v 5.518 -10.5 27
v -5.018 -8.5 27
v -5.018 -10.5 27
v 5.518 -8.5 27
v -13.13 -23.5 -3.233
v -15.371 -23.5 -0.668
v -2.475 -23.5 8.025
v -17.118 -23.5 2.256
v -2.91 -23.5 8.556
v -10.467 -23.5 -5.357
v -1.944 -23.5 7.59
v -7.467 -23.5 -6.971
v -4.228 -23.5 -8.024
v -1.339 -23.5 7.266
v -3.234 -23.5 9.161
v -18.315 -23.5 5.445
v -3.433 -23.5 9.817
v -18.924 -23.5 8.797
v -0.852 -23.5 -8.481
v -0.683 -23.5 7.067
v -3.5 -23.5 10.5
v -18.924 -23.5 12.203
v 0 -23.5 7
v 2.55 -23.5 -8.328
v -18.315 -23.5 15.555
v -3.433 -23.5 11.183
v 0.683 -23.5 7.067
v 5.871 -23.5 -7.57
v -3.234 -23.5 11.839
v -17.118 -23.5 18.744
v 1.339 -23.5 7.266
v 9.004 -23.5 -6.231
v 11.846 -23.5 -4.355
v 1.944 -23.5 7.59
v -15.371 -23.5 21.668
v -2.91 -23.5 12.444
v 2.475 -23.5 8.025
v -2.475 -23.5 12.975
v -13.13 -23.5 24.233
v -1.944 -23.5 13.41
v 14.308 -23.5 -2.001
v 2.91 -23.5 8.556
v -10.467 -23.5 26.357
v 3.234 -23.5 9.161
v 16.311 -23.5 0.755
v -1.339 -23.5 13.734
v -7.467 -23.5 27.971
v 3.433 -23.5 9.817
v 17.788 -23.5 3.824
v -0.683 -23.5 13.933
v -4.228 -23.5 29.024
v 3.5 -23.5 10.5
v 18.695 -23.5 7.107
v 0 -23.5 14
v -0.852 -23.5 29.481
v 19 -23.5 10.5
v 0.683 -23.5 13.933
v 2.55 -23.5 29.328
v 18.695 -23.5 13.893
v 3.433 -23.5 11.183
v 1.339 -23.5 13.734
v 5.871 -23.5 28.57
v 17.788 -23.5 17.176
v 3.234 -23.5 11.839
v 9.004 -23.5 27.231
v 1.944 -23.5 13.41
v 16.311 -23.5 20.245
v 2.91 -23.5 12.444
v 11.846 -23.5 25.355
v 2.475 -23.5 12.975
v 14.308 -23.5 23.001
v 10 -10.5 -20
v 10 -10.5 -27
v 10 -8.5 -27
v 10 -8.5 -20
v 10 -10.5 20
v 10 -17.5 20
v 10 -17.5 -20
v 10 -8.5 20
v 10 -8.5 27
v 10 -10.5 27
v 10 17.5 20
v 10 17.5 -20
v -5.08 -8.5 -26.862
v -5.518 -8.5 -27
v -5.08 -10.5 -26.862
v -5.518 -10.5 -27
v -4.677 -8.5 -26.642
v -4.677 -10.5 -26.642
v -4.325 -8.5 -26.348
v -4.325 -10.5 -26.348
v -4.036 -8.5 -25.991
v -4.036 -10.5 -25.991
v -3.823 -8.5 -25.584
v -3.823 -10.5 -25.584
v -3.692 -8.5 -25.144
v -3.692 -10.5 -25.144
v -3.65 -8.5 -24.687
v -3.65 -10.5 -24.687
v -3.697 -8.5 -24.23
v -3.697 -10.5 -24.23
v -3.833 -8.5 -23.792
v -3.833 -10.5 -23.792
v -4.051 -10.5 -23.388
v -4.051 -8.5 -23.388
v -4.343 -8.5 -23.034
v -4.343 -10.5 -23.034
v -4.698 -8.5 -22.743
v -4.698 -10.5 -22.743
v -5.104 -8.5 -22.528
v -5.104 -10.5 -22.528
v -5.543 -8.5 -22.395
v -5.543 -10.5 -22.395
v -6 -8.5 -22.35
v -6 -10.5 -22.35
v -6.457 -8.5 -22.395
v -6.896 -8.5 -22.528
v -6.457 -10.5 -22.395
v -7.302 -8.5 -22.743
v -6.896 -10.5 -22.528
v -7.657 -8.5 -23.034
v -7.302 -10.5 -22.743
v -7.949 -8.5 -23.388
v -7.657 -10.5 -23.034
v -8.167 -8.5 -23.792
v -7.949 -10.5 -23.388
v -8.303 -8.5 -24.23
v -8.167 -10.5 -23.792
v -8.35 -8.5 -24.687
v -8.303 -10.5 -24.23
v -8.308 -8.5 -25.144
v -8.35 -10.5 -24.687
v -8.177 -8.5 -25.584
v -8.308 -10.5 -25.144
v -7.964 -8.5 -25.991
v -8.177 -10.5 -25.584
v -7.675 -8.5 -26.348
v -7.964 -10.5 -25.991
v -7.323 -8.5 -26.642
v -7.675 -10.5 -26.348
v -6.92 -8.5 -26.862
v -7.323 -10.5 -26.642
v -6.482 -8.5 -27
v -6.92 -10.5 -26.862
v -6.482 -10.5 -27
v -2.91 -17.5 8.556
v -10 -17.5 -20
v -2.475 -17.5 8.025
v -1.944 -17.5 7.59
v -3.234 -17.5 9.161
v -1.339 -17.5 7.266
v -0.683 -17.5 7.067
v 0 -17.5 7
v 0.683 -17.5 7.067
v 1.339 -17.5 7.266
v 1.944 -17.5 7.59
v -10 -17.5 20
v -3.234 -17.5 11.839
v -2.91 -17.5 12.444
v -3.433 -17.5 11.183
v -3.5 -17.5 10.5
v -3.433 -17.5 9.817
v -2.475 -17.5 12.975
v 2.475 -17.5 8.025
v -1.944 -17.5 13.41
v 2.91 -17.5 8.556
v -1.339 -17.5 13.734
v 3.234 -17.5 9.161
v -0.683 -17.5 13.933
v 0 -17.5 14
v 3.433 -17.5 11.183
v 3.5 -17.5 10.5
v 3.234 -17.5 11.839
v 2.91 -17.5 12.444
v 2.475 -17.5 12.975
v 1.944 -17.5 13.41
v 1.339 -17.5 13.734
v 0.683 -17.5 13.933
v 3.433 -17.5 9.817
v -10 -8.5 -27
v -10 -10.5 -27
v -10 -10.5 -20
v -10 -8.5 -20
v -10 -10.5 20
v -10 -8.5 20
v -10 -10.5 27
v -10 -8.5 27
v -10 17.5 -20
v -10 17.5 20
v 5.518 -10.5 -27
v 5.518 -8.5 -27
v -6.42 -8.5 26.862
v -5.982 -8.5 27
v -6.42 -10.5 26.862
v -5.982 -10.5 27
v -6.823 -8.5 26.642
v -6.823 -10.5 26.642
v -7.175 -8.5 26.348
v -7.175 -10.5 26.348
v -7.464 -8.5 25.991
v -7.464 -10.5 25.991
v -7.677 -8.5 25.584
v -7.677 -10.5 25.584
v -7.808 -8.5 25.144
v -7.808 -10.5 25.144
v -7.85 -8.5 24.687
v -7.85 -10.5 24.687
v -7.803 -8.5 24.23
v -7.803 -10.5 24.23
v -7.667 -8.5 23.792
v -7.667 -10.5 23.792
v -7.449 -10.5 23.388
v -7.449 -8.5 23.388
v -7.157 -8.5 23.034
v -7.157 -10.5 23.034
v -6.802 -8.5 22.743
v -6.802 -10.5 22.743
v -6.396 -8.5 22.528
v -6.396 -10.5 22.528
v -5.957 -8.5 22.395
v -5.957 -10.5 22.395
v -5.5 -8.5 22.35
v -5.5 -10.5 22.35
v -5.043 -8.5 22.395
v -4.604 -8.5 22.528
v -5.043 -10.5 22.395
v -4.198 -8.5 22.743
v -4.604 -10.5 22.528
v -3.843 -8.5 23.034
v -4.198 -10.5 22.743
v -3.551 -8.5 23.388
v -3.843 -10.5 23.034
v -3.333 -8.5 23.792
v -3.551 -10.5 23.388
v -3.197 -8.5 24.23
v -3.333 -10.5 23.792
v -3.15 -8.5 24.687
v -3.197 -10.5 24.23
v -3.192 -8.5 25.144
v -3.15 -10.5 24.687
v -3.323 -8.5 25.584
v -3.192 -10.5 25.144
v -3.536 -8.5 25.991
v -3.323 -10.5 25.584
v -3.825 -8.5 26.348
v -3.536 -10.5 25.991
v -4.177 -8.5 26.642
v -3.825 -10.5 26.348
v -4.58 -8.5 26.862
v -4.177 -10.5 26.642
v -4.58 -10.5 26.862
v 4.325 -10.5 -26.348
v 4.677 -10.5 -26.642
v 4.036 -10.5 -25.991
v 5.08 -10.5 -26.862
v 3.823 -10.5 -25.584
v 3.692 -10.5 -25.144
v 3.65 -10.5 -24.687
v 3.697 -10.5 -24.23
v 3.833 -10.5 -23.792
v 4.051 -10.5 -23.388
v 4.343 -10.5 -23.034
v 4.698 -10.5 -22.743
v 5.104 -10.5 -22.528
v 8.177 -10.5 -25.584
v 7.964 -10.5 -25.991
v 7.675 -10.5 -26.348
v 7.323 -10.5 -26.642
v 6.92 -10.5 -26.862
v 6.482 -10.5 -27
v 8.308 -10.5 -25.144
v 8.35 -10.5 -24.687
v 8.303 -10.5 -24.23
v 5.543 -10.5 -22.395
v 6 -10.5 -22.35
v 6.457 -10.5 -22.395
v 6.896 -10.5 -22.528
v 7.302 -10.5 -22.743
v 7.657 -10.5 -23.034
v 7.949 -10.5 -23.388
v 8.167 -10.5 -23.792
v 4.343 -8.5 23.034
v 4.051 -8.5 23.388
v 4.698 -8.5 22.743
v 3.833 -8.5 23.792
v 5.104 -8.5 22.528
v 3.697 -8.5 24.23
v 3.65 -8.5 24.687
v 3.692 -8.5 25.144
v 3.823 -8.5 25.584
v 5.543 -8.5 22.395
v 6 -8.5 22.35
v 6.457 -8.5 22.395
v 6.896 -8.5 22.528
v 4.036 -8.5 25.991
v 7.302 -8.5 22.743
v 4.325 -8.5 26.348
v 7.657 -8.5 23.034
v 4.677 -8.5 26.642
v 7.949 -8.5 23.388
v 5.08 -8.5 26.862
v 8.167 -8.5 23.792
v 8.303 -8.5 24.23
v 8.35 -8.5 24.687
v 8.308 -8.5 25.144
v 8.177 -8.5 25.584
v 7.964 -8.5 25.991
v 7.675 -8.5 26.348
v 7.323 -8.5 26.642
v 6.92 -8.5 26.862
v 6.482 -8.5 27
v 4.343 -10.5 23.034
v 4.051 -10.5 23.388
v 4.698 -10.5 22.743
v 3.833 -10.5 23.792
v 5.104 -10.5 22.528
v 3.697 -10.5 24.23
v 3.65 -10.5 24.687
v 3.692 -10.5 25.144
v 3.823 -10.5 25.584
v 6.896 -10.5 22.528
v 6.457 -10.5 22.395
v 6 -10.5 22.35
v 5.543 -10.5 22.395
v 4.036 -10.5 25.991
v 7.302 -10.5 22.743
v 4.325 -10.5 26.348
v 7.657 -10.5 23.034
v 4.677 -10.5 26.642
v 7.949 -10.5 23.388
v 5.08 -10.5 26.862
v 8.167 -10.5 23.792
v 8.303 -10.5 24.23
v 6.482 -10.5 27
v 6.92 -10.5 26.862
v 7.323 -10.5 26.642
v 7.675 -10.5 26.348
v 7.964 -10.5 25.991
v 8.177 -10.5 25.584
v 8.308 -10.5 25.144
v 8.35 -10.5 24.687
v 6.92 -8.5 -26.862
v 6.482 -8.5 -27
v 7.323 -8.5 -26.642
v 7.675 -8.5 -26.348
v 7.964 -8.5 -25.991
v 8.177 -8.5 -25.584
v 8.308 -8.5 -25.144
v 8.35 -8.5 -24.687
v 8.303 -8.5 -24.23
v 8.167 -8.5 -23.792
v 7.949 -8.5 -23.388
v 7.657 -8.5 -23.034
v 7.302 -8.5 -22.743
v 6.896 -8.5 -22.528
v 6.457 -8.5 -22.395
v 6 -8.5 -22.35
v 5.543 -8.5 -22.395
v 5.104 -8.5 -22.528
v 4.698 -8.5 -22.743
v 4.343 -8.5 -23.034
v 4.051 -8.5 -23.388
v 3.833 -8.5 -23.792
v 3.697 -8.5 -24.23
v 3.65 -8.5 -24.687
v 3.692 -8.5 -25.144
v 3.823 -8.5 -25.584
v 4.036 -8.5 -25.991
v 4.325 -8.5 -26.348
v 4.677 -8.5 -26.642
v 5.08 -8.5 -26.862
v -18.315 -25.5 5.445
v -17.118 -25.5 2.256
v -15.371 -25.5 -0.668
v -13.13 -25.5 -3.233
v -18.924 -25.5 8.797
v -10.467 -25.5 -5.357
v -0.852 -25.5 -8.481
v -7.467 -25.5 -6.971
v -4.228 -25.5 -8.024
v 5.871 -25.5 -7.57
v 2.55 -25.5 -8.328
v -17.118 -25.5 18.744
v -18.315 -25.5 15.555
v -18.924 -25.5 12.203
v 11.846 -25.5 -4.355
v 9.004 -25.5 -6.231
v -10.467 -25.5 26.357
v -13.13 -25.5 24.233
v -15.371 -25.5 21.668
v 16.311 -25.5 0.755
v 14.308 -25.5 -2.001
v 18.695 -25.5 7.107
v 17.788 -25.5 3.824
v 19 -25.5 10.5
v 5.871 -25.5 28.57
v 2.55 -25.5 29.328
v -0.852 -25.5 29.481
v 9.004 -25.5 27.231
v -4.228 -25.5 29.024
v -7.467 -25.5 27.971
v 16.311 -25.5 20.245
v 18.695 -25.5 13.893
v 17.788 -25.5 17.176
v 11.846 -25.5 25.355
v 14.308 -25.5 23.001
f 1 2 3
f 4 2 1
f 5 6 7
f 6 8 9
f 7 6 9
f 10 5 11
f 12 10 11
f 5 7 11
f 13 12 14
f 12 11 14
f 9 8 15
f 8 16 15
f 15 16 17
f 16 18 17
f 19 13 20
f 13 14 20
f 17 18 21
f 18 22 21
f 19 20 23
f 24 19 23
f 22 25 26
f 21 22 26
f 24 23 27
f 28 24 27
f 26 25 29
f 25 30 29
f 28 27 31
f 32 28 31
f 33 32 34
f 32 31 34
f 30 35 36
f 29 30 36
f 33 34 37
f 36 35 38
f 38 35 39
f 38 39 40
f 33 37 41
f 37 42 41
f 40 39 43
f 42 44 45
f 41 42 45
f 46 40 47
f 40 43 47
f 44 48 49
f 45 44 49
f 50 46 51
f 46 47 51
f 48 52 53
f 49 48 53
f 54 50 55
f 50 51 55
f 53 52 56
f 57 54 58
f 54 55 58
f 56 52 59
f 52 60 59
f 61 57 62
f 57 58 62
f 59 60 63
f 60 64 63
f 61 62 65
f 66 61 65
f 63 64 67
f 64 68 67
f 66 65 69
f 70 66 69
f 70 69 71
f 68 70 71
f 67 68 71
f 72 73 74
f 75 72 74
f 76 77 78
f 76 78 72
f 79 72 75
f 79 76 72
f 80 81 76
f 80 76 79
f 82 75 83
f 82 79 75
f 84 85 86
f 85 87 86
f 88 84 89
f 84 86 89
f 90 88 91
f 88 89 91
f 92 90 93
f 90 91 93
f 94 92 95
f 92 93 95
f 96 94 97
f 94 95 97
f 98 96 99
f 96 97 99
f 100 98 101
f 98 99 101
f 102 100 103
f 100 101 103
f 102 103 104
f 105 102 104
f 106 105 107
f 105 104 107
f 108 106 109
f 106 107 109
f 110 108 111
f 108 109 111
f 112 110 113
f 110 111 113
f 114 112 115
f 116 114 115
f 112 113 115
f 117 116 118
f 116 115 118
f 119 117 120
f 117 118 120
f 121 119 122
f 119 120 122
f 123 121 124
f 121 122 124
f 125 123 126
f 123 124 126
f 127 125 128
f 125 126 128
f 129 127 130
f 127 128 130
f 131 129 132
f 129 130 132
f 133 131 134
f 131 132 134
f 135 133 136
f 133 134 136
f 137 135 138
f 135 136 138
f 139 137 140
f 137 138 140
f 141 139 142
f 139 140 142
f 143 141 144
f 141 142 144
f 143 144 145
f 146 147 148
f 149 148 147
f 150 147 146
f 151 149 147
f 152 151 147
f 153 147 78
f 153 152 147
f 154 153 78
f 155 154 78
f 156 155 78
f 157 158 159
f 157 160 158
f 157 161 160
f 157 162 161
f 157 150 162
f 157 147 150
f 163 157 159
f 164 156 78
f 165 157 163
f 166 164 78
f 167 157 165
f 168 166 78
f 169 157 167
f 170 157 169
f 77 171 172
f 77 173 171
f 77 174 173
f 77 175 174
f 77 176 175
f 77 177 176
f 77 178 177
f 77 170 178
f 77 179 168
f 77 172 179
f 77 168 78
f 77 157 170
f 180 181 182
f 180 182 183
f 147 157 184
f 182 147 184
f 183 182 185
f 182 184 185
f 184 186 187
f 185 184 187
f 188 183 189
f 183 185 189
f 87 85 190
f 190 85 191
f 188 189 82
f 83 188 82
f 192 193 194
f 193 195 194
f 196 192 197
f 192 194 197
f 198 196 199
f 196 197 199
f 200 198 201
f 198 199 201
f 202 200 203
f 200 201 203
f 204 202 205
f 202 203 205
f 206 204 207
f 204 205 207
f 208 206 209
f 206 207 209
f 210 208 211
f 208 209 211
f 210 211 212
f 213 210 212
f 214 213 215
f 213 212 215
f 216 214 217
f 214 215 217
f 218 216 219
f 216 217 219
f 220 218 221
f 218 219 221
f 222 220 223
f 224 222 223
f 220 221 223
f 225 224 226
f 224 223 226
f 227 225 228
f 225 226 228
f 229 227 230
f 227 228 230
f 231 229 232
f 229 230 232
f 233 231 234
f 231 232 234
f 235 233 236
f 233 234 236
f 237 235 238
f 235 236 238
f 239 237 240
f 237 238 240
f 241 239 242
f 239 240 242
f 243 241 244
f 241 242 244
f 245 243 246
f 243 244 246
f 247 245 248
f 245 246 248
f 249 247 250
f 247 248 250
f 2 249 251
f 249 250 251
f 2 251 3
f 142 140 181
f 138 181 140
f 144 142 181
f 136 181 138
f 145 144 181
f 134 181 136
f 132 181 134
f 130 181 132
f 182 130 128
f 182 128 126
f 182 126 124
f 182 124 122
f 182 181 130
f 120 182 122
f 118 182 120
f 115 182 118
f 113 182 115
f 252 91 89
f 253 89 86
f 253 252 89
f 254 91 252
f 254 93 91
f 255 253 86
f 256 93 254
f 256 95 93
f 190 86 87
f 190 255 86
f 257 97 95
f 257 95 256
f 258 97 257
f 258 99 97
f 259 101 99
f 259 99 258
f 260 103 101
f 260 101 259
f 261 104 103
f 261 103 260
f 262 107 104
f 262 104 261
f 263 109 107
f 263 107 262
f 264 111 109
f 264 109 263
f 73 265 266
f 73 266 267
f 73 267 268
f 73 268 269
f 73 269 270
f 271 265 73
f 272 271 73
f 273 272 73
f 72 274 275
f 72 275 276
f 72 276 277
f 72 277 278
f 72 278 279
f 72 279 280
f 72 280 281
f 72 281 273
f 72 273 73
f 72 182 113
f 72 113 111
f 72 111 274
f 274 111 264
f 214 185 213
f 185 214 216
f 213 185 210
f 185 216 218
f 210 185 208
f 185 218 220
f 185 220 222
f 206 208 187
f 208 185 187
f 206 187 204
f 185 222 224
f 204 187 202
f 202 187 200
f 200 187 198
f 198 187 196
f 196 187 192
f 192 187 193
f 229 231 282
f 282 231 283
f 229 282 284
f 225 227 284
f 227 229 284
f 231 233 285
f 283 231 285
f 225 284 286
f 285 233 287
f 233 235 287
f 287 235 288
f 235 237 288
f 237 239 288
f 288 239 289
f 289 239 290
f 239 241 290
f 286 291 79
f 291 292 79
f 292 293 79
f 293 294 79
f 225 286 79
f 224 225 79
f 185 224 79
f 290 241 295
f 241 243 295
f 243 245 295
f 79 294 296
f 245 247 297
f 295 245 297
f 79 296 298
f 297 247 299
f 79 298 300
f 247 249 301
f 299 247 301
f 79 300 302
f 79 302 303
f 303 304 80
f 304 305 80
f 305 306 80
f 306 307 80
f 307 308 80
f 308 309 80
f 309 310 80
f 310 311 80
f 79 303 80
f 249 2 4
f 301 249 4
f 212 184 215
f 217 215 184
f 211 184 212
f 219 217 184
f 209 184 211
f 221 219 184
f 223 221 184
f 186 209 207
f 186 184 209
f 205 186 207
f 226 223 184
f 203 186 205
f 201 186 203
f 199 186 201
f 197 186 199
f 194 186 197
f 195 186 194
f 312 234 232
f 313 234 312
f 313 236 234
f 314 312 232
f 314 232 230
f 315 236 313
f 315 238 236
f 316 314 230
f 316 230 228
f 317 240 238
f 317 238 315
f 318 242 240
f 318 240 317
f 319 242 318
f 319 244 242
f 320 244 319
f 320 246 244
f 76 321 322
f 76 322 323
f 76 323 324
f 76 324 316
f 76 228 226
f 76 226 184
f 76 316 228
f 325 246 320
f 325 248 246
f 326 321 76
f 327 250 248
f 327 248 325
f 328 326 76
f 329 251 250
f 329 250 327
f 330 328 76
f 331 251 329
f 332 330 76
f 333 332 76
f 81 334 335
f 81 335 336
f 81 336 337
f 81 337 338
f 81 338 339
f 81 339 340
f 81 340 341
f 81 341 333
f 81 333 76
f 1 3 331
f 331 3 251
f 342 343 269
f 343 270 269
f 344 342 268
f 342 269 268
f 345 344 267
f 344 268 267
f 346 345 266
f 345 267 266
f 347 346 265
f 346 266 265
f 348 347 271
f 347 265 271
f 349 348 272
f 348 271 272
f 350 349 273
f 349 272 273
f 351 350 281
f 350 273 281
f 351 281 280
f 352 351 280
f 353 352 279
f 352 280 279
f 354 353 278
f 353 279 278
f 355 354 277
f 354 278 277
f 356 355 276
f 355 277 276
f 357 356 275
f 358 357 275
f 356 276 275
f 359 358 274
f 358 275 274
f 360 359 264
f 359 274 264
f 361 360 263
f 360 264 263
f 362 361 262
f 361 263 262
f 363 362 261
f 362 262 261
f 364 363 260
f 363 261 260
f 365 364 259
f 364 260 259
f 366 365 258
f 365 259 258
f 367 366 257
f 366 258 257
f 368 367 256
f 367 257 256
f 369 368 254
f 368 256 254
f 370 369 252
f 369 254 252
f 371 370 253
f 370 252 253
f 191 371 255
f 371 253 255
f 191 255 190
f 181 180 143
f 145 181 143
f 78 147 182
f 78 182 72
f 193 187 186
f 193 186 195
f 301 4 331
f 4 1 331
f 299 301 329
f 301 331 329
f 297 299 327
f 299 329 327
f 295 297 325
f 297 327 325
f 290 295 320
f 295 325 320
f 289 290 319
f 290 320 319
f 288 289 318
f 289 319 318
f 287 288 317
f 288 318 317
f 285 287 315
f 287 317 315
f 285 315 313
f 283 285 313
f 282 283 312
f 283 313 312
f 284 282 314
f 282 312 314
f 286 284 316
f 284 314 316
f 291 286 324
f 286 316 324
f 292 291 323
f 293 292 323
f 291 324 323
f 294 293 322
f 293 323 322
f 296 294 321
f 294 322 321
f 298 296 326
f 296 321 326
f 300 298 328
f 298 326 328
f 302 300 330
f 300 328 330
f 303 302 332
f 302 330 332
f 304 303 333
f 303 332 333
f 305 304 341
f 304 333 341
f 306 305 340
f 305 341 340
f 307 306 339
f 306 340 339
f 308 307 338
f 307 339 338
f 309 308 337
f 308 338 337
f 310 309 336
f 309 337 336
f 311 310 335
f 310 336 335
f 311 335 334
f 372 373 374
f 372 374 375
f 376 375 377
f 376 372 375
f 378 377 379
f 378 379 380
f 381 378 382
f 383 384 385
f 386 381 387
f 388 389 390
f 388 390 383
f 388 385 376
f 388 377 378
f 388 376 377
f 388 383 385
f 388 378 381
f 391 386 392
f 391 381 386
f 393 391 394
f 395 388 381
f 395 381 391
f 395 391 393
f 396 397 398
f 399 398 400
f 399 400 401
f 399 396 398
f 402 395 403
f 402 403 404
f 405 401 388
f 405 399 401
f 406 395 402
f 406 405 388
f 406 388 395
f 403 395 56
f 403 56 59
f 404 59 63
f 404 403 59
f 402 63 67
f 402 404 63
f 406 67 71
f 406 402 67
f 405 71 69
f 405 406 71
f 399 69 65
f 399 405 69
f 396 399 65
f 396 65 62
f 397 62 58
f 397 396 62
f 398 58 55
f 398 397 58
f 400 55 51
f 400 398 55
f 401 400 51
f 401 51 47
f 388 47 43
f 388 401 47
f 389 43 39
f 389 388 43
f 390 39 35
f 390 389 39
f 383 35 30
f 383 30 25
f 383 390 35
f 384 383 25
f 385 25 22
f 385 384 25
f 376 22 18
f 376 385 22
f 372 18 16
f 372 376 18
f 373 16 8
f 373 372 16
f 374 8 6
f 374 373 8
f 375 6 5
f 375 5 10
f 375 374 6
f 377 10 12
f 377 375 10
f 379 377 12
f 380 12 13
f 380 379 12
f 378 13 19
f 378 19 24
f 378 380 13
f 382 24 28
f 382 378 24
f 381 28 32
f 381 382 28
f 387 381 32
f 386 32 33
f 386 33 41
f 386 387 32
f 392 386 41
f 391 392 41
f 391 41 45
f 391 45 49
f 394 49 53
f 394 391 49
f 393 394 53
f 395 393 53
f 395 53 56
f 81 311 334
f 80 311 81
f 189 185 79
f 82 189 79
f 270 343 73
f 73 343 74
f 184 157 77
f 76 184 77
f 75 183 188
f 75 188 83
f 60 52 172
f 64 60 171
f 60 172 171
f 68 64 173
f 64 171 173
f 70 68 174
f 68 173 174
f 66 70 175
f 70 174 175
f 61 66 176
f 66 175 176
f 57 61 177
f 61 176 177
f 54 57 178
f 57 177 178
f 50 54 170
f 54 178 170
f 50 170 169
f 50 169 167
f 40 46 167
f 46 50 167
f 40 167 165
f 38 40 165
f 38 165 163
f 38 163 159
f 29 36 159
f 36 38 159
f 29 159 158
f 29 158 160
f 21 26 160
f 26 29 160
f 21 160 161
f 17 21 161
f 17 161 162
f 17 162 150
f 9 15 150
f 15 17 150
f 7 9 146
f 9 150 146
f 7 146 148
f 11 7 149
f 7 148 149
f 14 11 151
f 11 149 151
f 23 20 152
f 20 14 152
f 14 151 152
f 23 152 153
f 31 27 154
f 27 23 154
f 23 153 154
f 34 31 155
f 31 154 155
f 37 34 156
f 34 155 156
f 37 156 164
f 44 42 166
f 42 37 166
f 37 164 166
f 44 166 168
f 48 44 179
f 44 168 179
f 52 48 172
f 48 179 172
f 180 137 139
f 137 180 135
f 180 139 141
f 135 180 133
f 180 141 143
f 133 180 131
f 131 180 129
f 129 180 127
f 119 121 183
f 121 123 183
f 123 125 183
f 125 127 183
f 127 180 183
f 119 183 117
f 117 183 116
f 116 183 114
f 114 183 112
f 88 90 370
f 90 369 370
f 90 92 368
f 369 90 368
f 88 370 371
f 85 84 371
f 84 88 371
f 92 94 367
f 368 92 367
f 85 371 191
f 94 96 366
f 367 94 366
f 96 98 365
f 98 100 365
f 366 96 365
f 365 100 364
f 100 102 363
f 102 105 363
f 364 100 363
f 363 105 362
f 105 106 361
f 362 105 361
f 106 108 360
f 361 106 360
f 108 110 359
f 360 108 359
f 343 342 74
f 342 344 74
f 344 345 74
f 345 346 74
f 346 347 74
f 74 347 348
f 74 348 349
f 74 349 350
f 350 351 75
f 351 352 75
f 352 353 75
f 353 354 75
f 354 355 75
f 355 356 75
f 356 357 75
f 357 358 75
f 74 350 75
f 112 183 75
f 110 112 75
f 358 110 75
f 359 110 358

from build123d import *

# Parameters (mm, degrees)
F0_W     = 20
F0_H     = 40
F1_DEPTH = 17.5
F2_W     = 20
F2_H     = 2
F3_DEPTH = 27
F4_R     = 3.5
F5_DEPTH = 8
F6_R     = 19
F7_DEPTH = 2
F8_R     = 2.35
F9_DEPTH = 25.4


with BuildPart() as f1:
    # F0 (on Front) → F1 (new body, symmetric)
    with BuildSketch(Plane.XZ):
        Rectangle(F0_W, F0_H)
    extrude(amount=F1_DEPTH, both=True)

    # F2 (on Top) → F3 (join, symmetric)
    with BuildSketch(Plane.XY):
        with Locations((0, -9.5)):
            Rectangle(F2_W, F2_H)
    extrude(amount=F3_DEPTH, both=True)

    # F4 (on face) → F5 (join)
    with BuildSketch(Plane.XZ.offset(17.5)):
        with Locations((0, 10.5)):
            Circle(F4_R)
    extrude(amount=F5_DEPTH)

    # F6 (on face) → F7 (join)
    with BuildSketch(Plane.XZ.offset(25.5)):
        with Locations((0, 10.5)):
            Circle(F6_R)
    extrude(amount=-F7_DEPTH)

    # F8 (on face) → F9 (cut)
    with BuildSketch(Plane.XZ.offset(10.5)):
        with Locations((-6, -24.7)):
            Circle(F8_R)
        with Locations((6, -24.7)):
            Circle(F8_R)
        with Locations((-5.5, 24.7)):
            Circle(F8_R)
        with Locations((6, 24.7)):
            Circle(F8_R)
    extrude(amount=-F9_DEPTH, mode=Mode.SUBTRACT)


solid = f1.part
